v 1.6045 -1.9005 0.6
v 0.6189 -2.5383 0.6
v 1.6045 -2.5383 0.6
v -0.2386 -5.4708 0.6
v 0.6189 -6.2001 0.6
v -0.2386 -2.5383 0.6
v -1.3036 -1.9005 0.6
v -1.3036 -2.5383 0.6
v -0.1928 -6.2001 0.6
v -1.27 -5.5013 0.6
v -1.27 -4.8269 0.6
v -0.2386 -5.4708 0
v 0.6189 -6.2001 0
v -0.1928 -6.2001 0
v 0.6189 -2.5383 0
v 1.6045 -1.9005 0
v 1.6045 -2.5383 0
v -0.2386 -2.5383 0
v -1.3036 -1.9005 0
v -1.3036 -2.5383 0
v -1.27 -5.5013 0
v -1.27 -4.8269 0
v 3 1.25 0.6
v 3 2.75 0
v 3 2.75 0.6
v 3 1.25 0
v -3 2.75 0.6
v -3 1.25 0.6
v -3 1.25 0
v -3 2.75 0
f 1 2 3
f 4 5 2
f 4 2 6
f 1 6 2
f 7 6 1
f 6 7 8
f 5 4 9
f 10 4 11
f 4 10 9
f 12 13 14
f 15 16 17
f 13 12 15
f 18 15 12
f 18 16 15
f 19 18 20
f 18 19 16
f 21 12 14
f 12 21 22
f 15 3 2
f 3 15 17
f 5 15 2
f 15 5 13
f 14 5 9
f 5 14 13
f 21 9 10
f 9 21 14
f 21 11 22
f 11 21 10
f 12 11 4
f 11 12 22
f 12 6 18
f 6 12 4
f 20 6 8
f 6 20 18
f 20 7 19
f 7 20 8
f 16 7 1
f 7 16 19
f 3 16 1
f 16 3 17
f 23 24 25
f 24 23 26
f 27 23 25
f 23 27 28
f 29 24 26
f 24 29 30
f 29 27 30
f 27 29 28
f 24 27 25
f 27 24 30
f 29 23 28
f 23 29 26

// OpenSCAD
$fn = 50;

difference() {
	union() {
		translate(v = [0.0, -4.0, 0.6]) {
			rotate(a = [180, 0, 0]) {
				linear_extrude(height = 0.6) {
					text(font = "Liberation Sans:style=Bold", halign = "center", size = 4.5, text = "1", valign = "center");
				}
			}
		}
		translate(v = [-3.0, 1.25, 0]) {
			cube(size = [6, 1.5, 0.6]);
		}
	}
	union();
}
